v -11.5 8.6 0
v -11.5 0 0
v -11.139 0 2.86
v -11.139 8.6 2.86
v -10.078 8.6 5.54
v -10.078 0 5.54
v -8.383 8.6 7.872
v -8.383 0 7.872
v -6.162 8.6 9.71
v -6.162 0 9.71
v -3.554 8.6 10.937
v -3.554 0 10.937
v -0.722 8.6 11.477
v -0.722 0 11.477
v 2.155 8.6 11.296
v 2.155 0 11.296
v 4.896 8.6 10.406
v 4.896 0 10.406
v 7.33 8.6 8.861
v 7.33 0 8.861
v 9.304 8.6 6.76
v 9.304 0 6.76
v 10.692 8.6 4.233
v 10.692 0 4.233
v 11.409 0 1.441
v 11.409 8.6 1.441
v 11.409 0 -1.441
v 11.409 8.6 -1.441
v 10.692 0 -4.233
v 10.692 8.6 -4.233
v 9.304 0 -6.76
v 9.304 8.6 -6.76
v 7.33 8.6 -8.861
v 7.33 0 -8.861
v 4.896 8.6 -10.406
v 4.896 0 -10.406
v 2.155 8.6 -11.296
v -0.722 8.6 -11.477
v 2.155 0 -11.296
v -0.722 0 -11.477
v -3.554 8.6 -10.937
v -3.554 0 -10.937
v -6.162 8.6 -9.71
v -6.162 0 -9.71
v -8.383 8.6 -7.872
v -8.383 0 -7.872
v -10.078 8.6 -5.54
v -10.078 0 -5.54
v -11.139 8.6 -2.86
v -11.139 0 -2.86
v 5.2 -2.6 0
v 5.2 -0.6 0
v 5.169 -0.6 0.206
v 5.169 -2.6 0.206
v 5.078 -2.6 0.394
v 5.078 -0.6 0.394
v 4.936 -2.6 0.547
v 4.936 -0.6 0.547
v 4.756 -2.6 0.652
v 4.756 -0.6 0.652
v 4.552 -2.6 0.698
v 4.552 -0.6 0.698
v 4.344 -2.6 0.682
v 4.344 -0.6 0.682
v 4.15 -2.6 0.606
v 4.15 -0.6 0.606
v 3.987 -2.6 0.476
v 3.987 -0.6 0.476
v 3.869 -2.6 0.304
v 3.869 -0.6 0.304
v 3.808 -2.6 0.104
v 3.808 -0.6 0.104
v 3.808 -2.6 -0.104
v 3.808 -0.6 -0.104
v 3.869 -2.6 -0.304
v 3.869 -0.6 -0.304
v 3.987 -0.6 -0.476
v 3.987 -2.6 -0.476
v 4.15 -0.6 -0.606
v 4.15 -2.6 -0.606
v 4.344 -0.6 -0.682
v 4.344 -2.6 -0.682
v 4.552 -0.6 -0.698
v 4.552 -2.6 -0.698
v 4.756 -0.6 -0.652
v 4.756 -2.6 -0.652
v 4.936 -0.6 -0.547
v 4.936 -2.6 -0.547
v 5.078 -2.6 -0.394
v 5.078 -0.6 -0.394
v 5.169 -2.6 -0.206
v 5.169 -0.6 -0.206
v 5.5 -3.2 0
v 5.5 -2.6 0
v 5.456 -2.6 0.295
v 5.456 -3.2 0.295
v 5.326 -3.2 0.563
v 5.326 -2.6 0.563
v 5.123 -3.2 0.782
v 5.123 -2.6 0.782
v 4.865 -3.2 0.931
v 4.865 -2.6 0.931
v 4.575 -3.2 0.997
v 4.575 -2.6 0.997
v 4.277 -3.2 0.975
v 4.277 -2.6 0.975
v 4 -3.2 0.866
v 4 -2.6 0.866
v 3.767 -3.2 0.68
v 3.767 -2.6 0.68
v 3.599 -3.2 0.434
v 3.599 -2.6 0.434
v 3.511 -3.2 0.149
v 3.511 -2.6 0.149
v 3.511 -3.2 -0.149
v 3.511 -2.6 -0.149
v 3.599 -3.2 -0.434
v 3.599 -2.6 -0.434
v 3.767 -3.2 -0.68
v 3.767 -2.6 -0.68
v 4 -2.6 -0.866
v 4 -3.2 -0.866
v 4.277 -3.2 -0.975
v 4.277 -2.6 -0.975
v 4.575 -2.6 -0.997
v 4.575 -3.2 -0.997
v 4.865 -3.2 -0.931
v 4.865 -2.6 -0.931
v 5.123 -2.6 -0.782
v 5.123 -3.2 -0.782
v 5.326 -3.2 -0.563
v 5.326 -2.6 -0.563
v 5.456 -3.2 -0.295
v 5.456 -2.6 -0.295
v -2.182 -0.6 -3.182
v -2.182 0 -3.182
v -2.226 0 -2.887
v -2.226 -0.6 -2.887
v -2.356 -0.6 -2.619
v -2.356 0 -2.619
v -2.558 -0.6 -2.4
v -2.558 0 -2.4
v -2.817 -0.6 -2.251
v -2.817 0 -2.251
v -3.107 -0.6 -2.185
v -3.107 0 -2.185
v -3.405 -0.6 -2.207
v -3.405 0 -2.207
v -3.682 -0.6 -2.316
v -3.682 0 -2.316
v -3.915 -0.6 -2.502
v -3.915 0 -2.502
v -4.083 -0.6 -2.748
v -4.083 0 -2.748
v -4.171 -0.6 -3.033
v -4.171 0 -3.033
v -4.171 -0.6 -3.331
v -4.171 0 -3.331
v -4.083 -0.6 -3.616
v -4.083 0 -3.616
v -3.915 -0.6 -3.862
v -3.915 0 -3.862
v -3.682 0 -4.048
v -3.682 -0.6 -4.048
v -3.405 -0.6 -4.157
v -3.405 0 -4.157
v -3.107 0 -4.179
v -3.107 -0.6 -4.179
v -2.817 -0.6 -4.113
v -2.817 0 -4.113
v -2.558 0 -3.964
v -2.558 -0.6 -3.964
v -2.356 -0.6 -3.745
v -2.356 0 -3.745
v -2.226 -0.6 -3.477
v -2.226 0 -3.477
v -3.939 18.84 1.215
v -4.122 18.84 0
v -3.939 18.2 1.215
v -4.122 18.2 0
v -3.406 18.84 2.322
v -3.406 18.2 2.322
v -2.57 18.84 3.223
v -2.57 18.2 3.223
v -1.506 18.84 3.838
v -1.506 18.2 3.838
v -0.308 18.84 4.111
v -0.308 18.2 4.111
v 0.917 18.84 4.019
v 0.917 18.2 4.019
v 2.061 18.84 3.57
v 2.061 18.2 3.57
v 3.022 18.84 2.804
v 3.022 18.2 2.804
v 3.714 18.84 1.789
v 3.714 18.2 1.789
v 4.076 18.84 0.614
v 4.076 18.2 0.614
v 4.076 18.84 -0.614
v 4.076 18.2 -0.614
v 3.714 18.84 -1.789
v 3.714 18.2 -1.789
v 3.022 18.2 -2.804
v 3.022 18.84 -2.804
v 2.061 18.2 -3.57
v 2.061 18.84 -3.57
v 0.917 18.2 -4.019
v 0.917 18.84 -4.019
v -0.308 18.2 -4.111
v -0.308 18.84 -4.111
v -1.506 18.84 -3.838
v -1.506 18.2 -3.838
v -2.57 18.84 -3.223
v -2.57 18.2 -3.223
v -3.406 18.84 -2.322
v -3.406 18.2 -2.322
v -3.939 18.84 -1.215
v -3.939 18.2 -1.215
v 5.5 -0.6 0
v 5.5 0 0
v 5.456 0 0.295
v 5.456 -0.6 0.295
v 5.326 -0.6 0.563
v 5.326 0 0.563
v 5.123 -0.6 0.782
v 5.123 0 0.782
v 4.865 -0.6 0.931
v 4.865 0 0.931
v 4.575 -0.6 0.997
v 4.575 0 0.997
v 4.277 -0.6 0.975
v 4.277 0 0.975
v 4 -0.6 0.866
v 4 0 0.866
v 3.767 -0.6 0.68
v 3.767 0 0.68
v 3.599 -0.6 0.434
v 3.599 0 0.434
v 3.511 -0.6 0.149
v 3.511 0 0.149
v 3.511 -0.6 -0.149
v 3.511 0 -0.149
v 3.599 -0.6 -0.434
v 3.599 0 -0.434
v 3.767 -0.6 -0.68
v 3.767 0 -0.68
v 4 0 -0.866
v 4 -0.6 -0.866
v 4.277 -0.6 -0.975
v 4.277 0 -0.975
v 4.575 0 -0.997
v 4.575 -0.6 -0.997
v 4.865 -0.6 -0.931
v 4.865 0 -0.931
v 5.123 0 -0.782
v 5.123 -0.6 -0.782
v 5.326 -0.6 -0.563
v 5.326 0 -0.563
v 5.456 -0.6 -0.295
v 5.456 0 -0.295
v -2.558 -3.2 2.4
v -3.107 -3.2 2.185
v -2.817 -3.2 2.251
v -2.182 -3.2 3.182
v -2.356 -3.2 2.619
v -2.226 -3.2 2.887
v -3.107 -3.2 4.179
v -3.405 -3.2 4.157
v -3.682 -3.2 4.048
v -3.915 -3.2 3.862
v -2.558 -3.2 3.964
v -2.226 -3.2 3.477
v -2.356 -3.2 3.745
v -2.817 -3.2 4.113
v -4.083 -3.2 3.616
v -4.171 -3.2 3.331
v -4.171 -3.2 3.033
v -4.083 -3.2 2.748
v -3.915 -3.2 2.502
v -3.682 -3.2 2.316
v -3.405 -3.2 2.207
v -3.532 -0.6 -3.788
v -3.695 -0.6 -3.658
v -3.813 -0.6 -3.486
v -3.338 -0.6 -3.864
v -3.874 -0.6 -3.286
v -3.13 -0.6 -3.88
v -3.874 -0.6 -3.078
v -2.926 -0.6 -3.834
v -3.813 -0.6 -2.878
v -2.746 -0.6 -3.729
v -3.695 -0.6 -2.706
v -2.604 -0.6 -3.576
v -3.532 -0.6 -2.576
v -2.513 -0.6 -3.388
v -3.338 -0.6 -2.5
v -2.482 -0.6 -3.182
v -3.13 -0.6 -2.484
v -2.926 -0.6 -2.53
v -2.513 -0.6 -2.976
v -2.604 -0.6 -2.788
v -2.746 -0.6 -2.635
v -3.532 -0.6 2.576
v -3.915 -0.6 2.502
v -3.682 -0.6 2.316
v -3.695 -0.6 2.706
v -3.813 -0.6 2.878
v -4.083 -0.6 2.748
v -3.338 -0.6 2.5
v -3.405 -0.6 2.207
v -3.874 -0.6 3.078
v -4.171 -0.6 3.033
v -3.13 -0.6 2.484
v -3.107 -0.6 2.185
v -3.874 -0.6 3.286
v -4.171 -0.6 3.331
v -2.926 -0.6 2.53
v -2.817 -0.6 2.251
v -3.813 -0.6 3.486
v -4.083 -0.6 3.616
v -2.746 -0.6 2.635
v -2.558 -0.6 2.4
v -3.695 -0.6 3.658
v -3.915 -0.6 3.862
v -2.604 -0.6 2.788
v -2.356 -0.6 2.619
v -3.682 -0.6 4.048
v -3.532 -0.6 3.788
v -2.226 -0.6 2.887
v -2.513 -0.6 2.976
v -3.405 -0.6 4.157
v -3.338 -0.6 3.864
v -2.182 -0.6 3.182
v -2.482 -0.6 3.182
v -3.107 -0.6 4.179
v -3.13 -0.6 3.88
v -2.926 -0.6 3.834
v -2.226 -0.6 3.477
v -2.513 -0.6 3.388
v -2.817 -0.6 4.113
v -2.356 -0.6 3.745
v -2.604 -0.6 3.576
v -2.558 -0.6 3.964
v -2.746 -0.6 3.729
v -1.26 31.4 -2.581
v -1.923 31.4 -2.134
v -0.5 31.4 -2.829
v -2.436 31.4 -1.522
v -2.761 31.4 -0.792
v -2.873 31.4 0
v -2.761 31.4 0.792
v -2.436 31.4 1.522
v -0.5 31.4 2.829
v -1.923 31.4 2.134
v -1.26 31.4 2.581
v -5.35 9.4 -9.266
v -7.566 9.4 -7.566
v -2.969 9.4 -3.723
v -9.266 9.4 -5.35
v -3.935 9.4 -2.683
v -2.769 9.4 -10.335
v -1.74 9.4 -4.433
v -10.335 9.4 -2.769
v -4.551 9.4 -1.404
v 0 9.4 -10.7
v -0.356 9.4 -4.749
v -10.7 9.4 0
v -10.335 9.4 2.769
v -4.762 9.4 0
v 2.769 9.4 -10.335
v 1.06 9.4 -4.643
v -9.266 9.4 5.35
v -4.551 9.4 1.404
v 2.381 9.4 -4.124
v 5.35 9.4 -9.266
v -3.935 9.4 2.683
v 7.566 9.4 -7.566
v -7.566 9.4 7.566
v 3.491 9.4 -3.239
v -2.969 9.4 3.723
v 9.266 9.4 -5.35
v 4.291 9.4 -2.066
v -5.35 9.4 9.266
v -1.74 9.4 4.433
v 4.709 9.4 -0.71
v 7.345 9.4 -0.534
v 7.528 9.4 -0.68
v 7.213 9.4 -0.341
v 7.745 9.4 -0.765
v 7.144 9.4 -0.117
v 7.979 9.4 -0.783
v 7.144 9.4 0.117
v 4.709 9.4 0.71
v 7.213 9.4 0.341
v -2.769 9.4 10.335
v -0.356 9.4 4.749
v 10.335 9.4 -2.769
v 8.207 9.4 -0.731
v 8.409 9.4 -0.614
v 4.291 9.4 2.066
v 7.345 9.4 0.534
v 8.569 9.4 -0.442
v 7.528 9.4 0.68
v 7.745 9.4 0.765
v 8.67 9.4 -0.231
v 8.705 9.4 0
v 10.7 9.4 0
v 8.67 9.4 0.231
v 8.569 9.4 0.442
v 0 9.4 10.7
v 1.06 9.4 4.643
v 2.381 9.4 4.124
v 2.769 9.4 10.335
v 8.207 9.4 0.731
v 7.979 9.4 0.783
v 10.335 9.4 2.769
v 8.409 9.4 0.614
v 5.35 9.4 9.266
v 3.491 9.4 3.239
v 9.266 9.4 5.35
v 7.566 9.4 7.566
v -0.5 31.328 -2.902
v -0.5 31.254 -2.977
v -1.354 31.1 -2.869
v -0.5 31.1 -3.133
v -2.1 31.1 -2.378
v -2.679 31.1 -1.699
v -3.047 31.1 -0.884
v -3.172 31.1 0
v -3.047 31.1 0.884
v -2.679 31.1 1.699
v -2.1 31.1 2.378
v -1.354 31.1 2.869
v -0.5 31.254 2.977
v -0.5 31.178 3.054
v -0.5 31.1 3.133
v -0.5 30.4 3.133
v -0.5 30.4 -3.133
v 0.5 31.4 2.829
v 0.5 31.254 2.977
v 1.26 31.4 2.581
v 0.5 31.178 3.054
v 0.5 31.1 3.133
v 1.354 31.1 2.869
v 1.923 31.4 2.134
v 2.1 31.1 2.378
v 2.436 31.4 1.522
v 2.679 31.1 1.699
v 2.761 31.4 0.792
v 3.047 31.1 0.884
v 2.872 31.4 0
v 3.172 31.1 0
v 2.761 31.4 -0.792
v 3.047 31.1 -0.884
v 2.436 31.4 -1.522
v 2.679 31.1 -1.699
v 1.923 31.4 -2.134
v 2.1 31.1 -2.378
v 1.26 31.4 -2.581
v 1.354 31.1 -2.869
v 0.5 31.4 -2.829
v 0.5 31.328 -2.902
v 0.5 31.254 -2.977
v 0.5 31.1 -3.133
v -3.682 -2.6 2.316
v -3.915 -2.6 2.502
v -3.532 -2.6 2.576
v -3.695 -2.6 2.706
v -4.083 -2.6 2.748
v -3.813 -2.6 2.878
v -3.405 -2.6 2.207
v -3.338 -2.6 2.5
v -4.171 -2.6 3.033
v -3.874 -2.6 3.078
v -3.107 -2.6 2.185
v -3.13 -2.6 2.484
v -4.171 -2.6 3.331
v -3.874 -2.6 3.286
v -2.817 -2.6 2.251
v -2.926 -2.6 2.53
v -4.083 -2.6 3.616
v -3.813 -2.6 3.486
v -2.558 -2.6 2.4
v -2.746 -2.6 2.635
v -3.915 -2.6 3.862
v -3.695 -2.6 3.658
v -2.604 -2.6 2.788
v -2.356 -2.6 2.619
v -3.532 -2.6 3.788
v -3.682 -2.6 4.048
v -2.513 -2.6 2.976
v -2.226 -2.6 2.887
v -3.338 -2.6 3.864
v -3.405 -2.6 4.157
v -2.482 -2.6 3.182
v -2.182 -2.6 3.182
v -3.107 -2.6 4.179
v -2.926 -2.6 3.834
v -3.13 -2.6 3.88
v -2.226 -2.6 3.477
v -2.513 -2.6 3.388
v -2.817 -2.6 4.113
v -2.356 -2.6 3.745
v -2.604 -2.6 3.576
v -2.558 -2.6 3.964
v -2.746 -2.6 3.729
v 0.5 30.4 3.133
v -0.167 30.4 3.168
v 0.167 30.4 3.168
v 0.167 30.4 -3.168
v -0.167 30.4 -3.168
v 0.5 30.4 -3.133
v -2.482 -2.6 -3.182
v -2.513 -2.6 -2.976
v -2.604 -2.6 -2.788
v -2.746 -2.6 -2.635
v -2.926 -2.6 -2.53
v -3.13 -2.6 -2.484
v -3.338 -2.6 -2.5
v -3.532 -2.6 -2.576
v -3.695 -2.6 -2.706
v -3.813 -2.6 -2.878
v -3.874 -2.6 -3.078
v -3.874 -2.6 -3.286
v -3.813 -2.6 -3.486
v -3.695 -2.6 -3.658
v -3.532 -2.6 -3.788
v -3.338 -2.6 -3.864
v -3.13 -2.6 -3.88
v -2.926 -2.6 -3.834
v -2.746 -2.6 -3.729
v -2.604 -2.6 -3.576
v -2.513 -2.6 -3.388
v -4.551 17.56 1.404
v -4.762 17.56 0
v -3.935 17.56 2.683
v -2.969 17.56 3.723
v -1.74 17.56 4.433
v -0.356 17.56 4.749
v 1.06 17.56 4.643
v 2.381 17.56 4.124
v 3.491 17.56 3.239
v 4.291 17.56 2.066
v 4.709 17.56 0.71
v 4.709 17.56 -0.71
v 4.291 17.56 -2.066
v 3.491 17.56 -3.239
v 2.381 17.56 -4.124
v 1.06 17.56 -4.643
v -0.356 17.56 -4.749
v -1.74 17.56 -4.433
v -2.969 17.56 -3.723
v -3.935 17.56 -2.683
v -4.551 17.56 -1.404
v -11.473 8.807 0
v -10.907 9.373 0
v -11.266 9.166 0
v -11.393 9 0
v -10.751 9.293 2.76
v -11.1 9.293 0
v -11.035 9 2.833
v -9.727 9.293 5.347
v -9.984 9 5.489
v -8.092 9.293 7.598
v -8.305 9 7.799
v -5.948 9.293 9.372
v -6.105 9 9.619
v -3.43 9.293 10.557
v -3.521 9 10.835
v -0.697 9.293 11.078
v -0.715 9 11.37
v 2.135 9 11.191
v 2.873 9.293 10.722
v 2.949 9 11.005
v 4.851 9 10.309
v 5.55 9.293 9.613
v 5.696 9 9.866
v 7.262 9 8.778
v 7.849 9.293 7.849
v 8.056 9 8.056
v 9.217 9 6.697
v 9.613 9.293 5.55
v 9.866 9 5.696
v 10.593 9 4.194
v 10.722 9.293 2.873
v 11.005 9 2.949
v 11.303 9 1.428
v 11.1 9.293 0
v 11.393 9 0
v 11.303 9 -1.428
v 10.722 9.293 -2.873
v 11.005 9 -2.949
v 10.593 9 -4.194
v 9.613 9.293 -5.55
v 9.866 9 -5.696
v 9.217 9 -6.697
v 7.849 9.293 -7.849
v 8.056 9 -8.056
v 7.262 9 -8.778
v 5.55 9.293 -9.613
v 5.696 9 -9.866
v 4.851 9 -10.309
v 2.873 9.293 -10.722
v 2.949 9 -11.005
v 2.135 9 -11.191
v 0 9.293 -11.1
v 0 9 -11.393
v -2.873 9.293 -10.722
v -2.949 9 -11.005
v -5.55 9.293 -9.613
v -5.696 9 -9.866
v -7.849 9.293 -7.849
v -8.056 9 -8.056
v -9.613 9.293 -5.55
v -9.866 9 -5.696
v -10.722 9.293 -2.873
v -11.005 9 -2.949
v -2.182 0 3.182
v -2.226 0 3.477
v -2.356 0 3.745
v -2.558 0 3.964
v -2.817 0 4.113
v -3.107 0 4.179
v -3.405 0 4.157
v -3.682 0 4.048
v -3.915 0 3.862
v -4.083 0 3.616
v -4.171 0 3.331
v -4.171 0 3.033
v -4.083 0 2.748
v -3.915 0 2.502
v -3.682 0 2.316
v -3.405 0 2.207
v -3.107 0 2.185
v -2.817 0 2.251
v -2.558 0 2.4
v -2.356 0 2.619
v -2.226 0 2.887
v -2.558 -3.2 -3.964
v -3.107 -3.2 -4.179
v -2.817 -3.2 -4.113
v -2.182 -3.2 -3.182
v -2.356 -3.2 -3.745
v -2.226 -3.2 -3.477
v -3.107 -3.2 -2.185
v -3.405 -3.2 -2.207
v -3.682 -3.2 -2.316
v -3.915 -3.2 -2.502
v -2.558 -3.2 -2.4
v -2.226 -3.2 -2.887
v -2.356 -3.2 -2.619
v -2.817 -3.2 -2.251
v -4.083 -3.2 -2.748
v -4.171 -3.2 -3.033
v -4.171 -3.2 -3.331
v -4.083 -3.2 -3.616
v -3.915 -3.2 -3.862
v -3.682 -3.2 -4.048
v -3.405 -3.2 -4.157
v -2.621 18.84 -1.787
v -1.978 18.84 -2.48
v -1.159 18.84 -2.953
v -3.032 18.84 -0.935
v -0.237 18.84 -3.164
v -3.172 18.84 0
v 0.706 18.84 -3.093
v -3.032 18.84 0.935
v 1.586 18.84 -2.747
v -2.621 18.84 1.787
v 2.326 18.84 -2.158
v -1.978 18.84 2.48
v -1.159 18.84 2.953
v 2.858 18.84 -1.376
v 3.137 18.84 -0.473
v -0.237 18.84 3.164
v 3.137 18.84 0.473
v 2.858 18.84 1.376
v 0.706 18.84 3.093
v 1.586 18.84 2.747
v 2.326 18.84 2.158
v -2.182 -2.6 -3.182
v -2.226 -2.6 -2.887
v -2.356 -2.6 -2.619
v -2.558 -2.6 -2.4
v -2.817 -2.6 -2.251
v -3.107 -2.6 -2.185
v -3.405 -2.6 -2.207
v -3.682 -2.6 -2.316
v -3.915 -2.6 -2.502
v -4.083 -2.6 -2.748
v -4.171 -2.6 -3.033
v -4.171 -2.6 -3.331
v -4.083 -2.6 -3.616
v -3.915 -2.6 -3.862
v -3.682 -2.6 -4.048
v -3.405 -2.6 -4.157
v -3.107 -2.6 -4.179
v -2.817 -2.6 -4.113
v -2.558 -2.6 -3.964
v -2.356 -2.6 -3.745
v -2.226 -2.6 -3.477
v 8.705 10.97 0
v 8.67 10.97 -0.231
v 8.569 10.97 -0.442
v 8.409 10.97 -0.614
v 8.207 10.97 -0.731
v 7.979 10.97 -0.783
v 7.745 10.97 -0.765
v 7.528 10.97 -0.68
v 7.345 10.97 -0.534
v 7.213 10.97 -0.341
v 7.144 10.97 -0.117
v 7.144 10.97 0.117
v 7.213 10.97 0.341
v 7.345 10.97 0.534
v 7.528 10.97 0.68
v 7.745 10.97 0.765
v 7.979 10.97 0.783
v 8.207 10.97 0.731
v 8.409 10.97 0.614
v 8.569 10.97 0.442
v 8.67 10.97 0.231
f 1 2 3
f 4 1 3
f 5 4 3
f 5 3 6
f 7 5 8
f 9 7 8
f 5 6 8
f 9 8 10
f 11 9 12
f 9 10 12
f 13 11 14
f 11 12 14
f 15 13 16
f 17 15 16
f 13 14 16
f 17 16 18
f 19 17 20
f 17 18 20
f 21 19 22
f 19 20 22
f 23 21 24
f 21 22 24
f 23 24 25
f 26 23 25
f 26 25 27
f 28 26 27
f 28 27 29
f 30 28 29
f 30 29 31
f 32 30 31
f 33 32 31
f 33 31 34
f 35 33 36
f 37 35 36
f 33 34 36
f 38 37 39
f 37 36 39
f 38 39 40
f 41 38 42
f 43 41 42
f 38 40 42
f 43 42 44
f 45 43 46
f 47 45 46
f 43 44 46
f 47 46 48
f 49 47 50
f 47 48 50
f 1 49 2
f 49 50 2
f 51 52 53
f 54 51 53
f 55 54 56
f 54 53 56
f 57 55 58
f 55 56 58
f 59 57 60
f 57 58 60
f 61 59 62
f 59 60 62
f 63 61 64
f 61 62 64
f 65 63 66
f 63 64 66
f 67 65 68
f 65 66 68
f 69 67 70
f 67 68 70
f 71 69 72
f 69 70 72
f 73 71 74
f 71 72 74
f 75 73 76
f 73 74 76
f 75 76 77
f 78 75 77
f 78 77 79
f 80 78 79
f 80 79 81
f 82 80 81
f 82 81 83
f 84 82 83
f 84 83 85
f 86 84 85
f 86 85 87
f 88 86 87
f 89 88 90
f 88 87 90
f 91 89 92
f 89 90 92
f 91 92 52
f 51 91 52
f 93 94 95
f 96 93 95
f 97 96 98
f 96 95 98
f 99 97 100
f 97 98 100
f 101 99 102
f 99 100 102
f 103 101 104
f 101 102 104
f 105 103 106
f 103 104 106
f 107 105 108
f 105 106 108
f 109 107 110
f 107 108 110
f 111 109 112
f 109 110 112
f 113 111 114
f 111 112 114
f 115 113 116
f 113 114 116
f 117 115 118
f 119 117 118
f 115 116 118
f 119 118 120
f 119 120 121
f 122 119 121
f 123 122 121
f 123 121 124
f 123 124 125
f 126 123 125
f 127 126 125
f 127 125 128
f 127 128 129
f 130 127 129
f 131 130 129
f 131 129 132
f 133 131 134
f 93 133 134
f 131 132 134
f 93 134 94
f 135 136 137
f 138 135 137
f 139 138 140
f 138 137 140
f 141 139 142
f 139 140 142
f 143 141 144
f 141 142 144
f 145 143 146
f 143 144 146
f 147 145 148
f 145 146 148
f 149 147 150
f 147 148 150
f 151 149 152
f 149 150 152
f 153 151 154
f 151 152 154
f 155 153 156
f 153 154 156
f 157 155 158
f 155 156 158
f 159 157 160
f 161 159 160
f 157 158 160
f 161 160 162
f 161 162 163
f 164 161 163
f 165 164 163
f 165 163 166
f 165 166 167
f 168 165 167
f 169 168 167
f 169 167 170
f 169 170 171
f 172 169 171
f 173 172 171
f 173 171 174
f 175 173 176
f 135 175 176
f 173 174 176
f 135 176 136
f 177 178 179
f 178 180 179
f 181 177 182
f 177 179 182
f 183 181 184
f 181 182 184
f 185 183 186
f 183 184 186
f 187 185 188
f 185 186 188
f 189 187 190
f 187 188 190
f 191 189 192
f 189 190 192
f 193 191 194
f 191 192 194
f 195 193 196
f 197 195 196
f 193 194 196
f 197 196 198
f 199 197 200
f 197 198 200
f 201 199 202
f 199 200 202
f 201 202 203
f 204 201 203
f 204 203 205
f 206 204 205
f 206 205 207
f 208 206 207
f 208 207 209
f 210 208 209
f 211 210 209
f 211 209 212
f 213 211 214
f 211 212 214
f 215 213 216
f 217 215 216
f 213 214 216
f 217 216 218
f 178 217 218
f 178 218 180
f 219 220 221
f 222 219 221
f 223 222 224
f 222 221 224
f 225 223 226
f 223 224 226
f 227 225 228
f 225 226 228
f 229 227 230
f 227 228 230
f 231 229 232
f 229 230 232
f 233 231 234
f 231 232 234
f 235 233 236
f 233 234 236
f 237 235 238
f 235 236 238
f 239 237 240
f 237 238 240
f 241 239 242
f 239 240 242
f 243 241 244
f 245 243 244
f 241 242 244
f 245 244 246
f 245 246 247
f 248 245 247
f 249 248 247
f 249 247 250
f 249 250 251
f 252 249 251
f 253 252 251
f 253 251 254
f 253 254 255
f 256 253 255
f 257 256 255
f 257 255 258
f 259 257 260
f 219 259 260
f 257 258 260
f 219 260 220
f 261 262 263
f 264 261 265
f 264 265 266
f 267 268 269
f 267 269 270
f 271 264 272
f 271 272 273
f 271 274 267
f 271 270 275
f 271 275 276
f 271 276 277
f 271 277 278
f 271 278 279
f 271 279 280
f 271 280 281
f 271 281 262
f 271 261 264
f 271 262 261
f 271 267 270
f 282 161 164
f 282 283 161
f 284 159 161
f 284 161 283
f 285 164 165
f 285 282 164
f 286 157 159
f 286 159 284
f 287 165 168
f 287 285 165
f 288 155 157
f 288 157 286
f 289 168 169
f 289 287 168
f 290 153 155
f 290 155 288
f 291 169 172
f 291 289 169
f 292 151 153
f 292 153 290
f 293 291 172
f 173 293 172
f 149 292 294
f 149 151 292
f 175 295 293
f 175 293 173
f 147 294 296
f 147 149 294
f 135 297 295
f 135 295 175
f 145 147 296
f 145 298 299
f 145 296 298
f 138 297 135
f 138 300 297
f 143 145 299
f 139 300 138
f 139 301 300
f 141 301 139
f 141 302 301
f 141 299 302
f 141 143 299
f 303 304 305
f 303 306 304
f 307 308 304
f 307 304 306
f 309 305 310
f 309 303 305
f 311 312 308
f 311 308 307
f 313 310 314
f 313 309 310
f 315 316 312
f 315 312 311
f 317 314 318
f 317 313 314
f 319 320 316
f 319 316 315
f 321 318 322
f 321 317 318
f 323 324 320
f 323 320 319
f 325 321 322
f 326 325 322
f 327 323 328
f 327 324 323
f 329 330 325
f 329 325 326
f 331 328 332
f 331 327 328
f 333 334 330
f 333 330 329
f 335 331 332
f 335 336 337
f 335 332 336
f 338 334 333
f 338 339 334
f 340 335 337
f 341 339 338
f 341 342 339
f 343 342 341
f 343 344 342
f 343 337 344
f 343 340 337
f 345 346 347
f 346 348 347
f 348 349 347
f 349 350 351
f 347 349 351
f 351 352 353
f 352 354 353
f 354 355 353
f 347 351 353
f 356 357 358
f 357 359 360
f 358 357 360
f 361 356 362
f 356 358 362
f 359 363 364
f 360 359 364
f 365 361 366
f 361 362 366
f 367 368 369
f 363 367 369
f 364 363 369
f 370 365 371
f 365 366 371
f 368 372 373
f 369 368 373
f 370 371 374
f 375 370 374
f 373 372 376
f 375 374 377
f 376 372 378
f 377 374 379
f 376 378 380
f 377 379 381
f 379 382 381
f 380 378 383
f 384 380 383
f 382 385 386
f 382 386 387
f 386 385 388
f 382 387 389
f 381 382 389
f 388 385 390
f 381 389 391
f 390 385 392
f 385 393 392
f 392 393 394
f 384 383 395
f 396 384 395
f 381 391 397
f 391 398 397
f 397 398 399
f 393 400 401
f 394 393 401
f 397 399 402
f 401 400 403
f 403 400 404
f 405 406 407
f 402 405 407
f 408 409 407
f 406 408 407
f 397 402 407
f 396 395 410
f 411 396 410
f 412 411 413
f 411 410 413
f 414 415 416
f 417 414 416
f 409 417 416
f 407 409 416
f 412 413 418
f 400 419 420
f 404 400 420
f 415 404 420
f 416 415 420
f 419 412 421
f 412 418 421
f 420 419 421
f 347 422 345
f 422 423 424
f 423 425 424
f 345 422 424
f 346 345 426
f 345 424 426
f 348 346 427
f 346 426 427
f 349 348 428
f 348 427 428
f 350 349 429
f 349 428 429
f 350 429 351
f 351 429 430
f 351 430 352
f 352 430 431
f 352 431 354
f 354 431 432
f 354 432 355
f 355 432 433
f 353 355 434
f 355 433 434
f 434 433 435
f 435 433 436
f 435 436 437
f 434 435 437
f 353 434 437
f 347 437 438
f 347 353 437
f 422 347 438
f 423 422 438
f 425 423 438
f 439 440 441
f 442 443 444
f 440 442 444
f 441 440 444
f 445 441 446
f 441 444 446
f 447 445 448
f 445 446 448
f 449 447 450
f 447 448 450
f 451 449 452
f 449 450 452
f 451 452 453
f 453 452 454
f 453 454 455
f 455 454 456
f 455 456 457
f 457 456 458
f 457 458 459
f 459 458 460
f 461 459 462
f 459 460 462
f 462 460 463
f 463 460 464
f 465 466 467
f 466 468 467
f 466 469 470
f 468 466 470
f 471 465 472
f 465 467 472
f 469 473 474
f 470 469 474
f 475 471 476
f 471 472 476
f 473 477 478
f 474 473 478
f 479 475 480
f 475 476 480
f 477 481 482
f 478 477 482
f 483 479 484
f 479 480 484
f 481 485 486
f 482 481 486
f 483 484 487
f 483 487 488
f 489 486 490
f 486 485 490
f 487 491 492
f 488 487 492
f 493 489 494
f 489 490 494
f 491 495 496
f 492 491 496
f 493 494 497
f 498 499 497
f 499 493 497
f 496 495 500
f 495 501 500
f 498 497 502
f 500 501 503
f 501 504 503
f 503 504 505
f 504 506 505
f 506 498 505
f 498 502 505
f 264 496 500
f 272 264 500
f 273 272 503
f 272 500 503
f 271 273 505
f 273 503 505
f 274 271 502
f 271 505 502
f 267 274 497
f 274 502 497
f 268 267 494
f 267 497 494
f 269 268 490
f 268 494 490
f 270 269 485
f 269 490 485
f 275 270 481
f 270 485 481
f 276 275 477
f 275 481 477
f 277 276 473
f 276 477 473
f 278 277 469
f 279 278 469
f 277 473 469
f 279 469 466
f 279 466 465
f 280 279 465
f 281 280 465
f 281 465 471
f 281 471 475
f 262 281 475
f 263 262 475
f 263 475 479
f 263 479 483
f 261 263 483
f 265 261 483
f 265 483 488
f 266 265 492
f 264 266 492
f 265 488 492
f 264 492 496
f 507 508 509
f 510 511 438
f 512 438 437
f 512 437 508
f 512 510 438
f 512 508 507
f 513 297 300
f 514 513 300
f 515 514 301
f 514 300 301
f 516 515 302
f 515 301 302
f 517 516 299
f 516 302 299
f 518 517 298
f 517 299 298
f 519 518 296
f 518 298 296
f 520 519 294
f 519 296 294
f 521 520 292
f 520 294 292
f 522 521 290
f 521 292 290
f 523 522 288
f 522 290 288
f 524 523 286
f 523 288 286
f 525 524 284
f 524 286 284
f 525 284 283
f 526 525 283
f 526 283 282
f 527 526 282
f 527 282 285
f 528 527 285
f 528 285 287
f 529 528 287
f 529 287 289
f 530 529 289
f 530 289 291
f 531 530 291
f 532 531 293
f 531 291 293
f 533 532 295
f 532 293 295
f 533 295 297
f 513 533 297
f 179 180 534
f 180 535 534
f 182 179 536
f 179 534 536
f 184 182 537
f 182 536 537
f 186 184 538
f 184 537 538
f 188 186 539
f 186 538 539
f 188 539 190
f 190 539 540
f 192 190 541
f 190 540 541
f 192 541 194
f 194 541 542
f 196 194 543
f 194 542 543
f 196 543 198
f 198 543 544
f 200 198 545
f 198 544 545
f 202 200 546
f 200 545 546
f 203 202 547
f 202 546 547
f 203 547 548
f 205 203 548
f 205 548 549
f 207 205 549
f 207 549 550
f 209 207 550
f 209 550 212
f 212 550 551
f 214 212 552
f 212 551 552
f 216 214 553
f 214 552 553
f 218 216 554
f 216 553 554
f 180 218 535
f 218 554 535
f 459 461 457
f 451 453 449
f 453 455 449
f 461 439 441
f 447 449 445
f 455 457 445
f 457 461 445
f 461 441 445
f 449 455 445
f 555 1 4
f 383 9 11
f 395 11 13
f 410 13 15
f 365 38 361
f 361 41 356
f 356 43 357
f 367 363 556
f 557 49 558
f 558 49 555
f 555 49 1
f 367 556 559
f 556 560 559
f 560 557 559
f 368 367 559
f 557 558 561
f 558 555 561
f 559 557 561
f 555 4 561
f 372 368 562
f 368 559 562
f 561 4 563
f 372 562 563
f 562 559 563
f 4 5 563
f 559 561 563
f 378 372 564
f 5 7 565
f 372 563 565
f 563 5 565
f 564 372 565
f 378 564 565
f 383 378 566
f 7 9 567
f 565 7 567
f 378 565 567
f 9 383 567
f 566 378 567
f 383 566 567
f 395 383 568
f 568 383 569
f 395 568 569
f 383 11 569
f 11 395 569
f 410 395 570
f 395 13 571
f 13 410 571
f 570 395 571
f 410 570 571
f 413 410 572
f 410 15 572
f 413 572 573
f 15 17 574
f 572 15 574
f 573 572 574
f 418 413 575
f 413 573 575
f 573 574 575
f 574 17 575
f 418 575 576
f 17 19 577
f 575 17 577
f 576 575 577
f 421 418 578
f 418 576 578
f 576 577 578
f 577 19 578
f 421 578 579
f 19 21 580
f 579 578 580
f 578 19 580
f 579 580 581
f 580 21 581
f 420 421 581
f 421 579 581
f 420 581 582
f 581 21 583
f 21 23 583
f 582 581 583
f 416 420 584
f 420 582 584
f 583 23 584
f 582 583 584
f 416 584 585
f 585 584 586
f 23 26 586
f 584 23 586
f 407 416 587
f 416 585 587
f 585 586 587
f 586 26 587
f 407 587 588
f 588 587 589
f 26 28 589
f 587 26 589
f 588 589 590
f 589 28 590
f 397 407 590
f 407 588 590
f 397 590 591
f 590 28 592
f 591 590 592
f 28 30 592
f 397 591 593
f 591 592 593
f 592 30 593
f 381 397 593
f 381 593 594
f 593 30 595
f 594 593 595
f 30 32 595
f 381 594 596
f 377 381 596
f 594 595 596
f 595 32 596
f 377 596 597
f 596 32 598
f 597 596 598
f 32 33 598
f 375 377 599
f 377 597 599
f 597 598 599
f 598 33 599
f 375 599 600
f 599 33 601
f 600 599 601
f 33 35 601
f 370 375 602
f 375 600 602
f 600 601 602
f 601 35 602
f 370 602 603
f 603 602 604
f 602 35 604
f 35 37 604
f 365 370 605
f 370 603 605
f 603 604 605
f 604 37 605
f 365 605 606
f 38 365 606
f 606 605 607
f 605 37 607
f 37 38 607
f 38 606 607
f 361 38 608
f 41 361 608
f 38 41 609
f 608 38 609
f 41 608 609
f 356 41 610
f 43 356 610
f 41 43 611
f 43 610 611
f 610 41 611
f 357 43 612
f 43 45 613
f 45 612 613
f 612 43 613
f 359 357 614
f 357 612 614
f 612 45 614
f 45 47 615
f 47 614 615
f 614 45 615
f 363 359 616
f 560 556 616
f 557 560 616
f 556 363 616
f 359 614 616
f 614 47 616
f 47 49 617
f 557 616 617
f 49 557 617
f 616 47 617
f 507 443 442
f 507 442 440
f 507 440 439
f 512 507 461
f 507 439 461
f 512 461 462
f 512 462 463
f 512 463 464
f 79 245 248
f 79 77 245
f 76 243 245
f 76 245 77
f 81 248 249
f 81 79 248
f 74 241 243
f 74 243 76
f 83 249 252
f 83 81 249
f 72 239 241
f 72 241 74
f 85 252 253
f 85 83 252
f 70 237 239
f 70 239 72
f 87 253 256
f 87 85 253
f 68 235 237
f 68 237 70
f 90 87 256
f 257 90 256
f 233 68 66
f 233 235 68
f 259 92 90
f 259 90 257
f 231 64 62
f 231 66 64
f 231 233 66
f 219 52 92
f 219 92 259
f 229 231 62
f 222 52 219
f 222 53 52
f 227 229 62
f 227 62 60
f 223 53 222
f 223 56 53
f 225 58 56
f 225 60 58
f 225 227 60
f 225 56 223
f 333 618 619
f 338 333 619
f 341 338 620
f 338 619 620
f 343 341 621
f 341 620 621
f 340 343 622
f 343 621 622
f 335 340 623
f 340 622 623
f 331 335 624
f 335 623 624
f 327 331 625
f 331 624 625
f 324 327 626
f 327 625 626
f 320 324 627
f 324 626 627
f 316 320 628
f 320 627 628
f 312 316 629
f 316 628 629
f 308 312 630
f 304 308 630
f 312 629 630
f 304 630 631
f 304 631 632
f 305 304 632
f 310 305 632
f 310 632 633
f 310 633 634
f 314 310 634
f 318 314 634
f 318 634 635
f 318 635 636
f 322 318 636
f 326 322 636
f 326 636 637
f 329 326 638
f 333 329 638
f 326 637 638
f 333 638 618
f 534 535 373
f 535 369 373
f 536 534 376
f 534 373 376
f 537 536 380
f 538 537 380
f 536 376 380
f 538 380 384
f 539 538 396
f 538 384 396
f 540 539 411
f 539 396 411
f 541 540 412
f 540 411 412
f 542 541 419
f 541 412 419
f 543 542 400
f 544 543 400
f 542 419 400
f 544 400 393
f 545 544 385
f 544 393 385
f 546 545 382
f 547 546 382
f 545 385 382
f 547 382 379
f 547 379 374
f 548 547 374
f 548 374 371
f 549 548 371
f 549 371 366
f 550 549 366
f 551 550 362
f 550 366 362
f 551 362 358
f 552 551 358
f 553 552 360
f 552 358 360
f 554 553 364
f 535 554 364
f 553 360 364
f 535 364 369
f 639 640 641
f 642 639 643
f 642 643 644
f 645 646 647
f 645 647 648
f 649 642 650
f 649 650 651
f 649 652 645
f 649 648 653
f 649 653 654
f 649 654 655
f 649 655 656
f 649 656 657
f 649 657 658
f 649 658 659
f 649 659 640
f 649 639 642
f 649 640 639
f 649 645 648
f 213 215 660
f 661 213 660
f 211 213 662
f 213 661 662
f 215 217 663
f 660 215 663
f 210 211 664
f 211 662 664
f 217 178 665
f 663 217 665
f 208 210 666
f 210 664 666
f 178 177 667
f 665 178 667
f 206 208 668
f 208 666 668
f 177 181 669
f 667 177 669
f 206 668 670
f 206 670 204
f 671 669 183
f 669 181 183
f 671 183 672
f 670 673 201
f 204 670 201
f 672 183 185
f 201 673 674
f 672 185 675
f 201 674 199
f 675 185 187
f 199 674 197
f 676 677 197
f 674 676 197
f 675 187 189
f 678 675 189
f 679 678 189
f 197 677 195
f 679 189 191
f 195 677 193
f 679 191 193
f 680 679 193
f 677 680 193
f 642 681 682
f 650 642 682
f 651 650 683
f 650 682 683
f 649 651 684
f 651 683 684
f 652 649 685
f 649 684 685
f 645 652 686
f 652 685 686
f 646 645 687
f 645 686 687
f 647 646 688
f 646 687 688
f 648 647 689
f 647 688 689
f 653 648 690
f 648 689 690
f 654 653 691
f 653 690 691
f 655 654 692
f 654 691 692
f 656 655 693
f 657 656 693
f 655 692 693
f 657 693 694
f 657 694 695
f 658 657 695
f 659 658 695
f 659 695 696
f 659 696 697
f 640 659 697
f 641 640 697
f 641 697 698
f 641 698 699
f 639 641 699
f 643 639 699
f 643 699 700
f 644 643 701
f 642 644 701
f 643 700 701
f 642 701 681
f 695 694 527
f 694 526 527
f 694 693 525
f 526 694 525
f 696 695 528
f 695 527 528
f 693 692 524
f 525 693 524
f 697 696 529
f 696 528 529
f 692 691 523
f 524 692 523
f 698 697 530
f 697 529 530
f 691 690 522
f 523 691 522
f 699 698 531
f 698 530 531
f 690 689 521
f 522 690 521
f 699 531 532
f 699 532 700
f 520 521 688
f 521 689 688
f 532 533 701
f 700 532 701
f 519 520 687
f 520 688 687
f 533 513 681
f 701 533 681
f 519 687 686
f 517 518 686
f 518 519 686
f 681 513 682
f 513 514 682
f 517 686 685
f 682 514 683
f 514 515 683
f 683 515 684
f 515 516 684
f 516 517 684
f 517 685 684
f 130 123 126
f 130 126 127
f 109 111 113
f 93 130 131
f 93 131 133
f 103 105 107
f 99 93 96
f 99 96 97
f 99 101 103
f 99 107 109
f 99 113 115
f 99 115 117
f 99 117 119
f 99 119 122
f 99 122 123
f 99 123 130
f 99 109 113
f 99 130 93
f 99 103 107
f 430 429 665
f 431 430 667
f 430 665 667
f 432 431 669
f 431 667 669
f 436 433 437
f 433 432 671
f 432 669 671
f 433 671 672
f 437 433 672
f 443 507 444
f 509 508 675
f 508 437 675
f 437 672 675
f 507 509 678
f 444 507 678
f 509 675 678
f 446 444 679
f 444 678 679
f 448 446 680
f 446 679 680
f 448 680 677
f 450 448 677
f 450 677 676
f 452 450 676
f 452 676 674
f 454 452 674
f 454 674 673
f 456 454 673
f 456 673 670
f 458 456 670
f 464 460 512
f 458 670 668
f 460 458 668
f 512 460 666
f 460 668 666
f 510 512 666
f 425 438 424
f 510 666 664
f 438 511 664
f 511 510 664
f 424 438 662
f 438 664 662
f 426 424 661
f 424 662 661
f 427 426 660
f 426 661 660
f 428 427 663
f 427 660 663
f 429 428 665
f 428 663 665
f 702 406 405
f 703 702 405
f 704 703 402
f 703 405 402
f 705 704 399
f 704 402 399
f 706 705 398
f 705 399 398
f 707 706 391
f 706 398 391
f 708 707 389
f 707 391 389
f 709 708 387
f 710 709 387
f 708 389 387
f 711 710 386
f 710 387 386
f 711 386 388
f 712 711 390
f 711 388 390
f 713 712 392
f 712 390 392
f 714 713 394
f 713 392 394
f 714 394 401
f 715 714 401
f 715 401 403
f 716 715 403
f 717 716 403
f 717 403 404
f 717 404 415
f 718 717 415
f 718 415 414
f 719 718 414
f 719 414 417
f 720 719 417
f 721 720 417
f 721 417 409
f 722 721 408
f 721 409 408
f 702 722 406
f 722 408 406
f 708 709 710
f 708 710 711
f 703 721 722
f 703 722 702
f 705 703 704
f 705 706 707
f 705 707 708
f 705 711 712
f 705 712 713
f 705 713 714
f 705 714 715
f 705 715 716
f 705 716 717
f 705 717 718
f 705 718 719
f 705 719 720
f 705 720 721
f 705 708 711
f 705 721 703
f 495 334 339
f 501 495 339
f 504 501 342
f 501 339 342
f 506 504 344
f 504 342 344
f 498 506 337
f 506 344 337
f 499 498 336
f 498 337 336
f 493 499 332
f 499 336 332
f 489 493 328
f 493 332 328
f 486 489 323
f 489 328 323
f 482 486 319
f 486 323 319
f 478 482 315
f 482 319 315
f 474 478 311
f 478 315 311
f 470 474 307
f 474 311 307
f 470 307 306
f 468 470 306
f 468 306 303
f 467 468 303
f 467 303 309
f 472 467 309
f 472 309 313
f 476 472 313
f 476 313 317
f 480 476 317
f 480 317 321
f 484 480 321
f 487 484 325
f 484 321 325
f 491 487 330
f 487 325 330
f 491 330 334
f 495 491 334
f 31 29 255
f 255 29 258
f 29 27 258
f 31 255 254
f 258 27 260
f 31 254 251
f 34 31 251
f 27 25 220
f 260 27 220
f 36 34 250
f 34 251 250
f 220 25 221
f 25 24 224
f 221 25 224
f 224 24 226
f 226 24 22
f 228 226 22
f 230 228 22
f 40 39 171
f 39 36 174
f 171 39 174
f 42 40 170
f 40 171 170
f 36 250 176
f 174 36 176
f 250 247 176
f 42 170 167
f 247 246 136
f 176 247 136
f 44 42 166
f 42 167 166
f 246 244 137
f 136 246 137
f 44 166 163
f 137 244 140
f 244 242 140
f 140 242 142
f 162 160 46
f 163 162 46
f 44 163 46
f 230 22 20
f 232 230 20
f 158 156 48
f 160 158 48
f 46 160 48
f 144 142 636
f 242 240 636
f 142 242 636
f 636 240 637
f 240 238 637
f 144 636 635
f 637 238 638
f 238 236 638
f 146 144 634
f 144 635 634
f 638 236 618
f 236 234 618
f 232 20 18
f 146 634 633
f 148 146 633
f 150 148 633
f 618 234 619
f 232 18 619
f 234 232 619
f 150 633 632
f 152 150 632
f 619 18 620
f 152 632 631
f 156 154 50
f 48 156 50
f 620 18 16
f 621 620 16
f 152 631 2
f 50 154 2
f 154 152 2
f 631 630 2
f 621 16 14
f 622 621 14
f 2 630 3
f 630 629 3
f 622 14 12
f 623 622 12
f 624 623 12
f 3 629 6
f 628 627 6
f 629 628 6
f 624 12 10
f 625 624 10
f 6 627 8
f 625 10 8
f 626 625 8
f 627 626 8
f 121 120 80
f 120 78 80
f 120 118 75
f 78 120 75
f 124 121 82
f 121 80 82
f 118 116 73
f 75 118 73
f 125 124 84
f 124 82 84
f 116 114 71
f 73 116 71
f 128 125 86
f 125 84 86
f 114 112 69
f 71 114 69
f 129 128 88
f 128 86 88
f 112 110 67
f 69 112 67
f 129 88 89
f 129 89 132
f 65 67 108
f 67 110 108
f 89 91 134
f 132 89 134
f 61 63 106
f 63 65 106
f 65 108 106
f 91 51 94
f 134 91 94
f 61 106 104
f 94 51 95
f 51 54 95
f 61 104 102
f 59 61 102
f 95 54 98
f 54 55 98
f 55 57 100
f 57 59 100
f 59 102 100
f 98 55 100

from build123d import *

# Parameters (mm, degrees)
CHAMFER1_SIZE       = 0.3
SKETCH2_W           = 1
SKETCH2_H           = 6.571948564
CUT_EXTRUDE1_DEPTH  = 1
FILLET1_R           = 0.8
SKETCH3_R           = 0.785
BOSS_EXTRUDE1_DEPTH = 1.57
SKETCH4_R           = 1
BOSS_EXTRUDE2_DEPTH = 0.6
SKETCH5_R           = 0.7
BOSS_EXTRUDE3_DEPTH = 2
SKETCH6_R           = 1
BOSS_EXTRUDE4_DEPTH = 0.6


with BuildPart() as part:
    # Sketch1 → Revolve1 (revolve)
    with BuildSketch(Plane.XY):
        Polygon((0, 0), (0, 31.4), (-3.1725, 31.4), (-3.1725, 18.84), (-4.1225, 18.84), (-4.1225, 18.2), (-4.7625, 17.56), (-4.7625, 9.4), (-11.5, 9.4), (-11.5, 0), align=None)
    revolve(axis=Axis((0, 0, 0), (0, 1, 0)))

    # Chamfer1
    chamfer1_edges = [part.edges().sort_by_distance(p)[0] for p in [
        (3.1725, 31.4, 0),
    ]]
    chamfer(chamfer1_edges, length=CHAMFER1_SIZE)

    # Sketch2 → Cut-Extrude1 (cut)
    with BuildSketch(Plane(origin=(0, 31.4, 0), x_dir=(1, 0, 0), z_dir=(0, 1, 0))):
        Rectangle(SKETCH2_W, SKETCH2_H)
    extrude(amount=-CUT_EXTRUDE1_DEPTH, mode=Mode.SUBTRACT)

    # Fillet1
    fillet1_edges = [part.edges().sort_by_distance(p)[0] for p in [
        (11.5, 9.4, 0),
    ]]
    fillet(fillet1_edges, radius=FILLET1_R)

    # Sketch3 → Boss-Extrude1 (add)
    with BuildSketch(Plane(origin=(0, 9.4, 0), x_dir=(1, 0, 0), z_dir=(0, 1, 0))):
        with Locations((7.92, 0)):
            Circle(SKETCH3_R)
    extrude(amount=BOSS_EXTRUDE1_DEPTH)

    # Sketch4 → Boss-Extrude2 (add)
    with BuildSketch(Plane.XZ):
        with Locations((4.5, 0)):
            Circle(SKETCH4_R)
        with Locations((-3.181980515, 3.181980515)):
            Circle(SKETCH4_R)
        with Locations((-3.181980515, -3.181980515)):
            Circle(SKETCH4_R)
    extrude(amount=BOSS_EXTRUDE2_DEPTH)

    # Sketch5 → Boss-Extrude3 (add)
    with BuildSketch(Plane.XZ.offset(0.6)):
        with Locations((-3.181980515, 3.181980515)):
            Circle(SKETCH5_R)
        with Locations((4.5, 0)):
            Circle(SKETCH5_R)
        with Locations((-3.181980515, -3.181980515)):
            Circle(SKETCH5_R)
    extrude(amount=BOSS_EXTRUDE3_DEPTH)

    # Sketch6 → Boss-Extrude4 (add)
    with BuildSketch(Plane.XZ.offset(2.6)):
        with Locations((-3.181980515, 3.181980515)):
            Circle(SKETCH6_R)
        with Locations((4.5, 0)):
            Circle(SKETCH6_R)
        with Locations((-3.181980515, -3.181980515)):
            Circle(SKETCH6_R)
    extrude(amount=BOSS_EXTRUDE4_DEPTH)


solid = part.part
